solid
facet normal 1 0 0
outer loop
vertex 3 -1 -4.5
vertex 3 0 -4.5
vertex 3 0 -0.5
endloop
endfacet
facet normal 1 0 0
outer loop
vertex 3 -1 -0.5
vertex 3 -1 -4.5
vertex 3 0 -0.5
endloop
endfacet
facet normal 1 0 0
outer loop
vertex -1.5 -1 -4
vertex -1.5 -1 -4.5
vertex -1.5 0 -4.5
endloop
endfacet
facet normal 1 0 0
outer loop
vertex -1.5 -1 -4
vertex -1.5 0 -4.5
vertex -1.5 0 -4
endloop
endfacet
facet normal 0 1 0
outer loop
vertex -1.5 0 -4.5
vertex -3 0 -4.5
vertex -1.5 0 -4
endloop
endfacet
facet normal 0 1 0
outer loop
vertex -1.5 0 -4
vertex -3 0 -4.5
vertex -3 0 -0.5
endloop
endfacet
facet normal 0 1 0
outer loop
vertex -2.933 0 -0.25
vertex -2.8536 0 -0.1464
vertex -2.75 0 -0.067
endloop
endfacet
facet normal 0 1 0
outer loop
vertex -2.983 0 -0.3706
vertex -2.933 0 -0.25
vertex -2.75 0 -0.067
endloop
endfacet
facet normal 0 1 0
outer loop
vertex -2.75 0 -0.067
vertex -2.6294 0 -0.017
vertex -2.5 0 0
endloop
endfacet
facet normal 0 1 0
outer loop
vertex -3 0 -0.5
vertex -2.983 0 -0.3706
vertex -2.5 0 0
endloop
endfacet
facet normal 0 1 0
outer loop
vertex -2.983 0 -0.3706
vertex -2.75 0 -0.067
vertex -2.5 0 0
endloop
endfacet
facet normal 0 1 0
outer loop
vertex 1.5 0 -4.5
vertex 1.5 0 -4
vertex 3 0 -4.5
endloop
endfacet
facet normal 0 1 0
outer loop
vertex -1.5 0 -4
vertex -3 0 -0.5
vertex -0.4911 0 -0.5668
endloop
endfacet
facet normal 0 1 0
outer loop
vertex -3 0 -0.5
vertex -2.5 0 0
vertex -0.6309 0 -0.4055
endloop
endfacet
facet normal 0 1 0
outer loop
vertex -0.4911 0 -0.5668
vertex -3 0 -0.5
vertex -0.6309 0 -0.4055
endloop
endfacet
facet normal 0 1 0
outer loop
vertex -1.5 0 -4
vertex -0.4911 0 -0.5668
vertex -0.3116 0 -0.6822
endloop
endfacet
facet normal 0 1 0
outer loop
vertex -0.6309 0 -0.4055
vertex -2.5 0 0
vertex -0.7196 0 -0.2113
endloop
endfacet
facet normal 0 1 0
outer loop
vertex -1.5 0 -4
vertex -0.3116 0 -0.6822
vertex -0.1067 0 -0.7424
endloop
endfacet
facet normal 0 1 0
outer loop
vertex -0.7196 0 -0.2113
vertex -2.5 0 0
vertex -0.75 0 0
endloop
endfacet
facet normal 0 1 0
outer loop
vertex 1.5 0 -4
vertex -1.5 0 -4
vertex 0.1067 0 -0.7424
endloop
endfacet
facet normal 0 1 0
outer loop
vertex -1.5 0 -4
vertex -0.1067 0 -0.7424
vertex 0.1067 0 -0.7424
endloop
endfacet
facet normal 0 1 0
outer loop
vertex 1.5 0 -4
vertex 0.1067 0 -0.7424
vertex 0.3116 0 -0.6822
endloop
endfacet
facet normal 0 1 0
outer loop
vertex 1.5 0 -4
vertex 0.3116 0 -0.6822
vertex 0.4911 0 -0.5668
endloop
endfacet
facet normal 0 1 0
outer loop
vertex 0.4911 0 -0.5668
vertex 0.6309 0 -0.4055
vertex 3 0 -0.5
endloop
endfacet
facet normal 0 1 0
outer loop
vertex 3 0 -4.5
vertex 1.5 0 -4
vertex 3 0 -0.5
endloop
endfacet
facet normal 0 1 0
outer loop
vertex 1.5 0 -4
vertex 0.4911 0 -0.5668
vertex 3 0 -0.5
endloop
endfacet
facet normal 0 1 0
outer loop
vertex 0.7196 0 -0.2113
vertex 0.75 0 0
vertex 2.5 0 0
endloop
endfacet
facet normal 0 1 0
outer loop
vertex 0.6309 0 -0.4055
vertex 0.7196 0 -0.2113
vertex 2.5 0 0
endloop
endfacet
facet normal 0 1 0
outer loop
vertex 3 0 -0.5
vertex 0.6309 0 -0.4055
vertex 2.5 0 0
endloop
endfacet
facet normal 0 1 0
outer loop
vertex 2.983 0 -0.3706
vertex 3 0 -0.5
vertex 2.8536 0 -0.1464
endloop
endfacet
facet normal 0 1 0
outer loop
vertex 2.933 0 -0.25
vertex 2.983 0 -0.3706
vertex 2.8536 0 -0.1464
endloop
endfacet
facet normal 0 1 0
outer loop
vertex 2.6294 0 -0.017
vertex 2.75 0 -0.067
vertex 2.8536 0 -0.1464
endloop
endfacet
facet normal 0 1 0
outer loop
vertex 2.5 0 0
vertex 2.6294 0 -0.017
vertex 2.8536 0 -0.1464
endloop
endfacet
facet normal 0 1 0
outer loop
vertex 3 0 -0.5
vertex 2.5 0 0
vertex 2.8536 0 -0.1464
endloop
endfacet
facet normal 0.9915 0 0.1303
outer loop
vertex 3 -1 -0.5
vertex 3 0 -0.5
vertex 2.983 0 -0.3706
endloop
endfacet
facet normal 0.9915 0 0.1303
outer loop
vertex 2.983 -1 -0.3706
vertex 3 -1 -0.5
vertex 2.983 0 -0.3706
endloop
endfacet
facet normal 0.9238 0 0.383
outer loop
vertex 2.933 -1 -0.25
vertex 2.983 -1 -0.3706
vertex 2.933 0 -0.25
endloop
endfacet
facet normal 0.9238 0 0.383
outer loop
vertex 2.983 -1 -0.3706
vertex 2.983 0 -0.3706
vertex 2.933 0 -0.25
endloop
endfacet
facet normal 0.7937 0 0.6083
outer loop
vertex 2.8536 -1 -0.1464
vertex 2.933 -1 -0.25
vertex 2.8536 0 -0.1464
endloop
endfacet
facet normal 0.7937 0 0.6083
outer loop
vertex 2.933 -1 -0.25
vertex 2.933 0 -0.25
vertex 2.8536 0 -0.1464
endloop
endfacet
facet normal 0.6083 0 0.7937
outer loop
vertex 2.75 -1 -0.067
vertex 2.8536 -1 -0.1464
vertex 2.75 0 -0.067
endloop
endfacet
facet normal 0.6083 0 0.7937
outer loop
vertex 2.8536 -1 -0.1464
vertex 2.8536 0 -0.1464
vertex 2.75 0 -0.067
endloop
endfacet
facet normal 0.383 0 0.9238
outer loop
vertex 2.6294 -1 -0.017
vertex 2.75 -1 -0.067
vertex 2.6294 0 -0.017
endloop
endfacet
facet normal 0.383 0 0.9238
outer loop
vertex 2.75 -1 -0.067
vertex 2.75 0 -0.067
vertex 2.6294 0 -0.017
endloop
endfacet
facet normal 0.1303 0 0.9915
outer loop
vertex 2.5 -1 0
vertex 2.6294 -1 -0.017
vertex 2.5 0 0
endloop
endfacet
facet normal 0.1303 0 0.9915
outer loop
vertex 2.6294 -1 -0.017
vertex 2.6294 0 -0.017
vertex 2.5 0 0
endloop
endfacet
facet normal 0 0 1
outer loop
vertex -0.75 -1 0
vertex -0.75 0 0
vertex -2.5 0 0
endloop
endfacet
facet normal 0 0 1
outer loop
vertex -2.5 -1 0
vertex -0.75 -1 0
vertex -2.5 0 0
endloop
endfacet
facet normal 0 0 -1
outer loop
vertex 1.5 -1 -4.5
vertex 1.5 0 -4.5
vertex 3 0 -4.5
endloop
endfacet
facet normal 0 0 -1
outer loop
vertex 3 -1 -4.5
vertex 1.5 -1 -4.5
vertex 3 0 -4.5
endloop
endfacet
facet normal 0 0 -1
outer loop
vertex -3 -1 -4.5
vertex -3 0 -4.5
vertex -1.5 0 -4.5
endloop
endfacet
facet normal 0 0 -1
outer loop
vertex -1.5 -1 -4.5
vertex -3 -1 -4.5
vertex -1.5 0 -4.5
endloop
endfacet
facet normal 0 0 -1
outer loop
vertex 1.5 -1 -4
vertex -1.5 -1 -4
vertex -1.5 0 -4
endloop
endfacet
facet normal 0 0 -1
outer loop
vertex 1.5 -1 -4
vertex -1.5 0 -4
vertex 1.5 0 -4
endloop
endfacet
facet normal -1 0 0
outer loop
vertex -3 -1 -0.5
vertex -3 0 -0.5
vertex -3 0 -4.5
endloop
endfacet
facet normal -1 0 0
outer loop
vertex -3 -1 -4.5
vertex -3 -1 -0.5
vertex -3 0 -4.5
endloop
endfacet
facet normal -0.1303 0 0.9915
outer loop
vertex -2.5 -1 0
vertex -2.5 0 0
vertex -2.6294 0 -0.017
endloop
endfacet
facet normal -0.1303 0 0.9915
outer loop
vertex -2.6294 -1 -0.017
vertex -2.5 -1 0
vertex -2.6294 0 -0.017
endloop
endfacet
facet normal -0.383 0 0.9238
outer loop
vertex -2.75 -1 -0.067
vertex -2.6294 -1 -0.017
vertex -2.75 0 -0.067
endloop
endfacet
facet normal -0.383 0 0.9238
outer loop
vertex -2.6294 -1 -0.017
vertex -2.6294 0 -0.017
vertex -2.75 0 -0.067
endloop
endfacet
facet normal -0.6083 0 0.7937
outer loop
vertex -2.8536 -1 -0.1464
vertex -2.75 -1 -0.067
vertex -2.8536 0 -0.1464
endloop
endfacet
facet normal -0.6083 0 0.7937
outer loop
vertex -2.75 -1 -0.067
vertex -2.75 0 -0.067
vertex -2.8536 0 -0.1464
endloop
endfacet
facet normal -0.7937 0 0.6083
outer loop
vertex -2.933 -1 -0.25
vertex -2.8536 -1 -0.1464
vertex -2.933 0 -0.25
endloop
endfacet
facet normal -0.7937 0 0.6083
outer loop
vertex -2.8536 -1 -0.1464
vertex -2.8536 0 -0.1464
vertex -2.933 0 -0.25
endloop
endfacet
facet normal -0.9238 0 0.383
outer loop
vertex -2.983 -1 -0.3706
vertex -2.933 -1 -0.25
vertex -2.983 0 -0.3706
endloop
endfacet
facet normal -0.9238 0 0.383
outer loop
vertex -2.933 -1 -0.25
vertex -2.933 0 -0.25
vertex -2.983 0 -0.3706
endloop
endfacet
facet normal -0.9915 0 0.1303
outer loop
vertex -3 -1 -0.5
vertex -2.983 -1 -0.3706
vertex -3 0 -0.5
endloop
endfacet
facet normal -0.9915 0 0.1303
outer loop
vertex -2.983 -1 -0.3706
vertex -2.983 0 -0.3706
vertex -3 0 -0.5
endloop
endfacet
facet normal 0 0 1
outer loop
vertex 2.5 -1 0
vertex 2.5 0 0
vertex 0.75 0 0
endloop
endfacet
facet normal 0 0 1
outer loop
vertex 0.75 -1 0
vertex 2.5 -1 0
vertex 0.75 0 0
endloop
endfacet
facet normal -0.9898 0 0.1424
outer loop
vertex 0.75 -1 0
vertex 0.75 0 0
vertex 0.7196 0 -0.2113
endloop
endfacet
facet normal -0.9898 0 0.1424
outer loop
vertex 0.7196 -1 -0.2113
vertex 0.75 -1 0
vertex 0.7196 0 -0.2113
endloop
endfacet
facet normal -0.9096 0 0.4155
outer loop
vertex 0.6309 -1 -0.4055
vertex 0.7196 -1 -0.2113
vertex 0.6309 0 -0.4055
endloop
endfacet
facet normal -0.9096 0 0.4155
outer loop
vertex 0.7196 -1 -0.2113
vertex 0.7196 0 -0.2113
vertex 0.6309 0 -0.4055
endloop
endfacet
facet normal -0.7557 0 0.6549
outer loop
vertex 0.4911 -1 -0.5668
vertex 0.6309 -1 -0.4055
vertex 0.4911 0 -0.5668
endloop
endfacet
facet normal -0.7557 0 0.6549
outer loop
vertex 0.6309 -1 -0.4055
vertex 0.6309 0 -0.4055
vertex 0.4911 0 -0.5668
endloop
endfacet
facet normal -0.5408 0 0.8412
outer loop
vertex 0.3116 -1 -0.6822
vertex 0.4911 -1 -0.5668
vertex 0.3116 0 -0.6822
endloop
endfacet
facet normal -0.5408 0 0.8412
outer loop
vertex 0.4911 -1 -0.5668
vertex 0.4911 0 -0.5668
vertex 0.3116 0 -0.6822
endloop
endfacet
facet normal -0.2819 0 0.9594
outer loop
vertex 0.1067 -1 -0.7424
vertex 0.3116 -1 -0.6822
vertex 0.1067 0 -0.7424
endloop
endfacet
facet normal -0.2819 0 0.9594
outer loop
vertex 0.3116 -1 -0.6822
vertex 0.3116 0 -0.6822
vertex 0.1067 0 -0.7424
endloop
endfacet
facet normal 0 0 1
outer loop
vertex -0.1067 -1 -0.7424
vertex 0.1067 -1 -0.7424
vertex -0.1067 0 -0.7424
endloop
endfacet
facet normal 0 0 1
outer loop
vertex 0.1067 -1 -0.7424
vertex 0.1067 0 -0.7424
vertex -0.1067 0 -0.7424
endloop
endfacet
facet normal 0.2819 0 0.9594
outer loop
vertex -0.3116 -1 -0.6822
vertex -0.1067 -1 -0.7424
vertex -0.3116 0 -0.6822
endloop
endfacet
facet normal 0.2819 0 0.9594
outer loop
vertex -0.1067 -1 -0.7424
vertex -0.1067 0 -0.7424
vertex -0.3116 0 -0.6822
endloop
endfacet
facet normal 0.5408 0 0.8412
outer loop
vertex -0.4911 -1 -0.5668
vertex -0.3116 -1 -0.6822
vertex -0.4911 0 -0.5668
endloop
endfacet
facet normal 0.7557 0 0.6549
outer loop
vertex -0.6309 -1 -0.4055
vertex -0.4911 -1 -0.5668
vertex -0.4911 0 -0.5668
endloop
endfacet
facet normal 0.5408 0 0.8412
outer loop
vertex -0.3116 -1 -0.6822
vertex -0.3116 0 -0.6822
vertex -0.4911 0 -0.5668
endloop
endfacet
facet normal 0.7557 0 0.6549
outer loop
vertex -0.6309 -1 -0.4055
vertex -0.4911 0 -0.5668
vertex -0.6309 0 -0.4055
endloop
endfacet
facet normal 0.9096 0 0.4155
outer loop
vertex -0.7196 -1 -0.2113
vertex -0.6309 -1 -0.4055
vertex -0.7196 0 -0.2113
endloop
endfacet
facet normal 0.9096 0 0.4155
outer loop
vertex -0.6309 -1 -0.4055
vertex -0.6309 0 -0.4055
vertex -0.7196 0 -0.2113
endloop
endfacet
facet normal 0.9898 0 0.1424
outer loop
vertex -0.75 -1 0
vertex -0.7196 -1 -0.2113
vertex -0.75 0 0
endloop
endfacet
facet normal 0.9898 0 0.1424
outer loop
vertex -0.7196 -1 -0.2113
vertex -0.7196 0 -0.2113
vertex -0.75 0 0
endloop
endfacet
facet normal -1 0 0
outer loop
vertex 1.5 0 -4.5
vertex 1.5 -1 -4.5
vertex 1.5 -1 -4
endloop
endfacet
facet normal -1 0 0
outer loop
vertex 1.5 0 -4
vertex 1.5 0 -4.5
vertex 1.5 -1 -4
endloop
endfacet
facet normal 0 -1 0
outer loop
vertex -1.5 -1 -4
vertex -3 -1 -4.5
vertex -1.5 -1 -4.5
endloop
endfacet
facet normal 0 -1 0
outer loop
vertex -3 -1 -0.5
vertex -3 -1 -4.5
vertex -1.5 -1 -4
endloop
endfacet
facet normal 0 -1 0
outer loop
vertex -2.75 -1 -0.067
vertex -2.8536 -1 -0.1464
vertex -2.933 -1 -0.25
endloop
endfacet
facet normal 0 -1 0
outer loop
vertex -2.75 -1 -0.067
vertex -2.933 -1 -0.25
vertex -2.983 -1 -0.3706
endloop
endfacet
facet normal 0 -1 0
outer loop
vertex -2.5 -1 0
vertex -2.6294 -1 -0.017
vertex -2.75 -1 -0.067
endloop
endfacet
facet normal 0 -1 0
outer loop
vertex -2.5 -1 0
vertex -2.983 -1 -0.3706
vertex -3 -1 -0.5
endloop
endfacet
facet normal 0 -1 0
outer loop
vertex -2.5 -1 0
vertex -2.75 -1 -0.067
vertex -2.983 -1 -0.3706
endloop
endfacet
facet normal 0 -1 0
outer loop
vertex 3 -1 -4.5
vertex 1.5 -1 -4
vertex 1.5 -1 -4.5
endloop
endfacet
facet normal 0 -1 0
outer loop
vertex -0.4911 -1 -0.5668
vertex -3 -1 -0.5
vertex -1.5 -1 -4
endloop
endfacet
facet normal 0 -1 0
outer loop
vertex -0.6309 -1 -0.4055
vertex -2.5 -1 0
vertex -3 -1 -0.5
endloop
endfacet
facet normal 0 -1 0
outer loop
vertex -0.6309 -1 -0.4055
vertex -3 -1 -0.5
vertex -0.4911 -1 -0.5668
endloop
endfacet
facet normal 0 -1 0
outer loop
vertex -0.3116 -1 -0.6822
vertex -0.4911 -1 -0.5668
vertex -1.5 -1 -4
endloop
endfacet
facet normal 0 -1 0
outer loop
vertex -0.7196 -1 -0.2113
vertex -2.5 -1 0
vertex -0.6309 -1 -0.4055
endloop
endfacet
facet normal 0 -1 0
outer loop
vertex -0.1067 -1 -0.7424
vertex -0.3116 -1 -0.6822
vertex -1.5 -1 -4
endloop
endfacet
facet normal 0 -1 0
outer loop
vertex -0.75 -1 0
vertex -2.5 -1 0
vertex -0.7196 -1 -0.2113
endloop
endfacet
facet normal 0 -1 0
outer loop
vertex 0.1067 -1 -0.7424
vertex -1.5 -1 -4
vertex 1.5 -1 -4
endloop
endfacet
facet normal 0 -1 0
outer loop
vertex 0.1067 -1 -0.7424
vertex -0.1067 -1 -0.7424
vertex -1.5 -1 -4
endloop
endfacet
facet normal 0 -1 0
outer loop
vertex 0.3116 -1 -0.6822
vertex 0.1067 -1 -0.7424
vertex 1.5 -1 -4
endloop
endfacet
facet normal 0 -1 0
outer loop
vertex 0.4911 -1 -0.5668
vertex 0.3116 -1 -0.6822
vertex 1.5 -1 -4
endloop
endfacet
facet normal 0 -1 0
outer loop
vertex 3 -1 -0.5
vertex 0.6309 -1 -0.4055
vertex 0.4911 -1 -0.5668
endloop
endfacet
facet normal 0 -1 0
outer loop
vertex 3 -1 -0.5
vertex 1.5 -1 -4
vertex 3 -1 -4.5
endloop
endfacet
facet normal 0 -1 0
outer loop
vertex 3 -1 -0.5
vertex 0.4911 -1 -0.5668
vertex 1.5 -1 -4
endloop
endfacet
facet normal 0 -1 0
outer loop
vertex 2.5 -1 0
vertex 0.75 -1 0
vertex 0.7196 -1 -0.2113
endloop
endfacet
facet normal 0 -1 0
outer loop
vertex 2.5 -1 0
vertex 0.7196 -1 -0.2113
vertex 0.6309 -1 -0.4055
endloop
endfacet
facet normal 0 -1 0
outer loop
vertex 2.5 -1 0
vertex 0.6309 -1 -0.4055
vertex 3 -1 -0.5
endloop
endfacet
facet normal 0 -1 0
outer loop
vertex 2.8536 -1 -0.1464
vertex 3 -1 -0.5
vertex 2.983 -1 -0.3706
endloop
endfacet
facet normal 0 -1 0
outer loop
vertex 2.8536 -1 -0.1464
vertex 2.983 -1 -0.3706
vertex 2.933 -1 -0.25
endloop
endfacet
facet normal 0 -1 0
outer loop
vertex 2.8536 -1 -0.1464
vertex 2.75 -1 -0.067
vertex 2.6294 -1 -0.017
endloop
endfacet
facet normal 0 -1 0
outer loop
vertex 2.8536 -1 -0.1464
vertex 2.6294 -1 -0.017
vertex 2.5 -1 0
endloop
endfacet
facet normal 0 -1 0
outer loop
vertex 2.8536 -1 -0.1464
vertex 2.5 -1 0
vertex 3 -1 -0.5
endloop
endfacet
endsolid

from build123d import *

# Parameters (mm, degrees)
F1_DEPTH = 1
F2_W     = 3
F2_H     = 0.5
F3_DEPTH = 25


with BuildPart() as f1:
    # F0 (on Front) → F1 (new body)
    with BuildSketch(Plane.XZ):
        with BuildLine():
            ThreePointArc((0.75, 0), (0, -0.75), (-0.75, 0))
            Line((-0.75, 0), (-2.5, 0))
            ThreePointArc((-2.5, 0), (-2.853553, -0.146447), (-3, -0.5))
            Line((-3, -0.5), (-3, -4.5))
            Line((-3, -4.5), (3, -4.5))
            Line((3, -4.5), (3, -0.5))
            ThreePointArc((3, -0.5), (2.853553, -0.146447), (2.5, 0))
            Line((2.5, 0), (0.75, 0))
        make_face()
    extrude(amount=F1_DEPTH)

    # F2 (on face) → F3 (cut)
    with BuildSketch(Plane.XZ.offset(1)):
        with Locations((0, -4.25)):
            Rectangle(F2_W, F2_H)
    extrude(amount=-F3_DEPTH, mode=Mode.SUBTRACT)


solid = f1.part
